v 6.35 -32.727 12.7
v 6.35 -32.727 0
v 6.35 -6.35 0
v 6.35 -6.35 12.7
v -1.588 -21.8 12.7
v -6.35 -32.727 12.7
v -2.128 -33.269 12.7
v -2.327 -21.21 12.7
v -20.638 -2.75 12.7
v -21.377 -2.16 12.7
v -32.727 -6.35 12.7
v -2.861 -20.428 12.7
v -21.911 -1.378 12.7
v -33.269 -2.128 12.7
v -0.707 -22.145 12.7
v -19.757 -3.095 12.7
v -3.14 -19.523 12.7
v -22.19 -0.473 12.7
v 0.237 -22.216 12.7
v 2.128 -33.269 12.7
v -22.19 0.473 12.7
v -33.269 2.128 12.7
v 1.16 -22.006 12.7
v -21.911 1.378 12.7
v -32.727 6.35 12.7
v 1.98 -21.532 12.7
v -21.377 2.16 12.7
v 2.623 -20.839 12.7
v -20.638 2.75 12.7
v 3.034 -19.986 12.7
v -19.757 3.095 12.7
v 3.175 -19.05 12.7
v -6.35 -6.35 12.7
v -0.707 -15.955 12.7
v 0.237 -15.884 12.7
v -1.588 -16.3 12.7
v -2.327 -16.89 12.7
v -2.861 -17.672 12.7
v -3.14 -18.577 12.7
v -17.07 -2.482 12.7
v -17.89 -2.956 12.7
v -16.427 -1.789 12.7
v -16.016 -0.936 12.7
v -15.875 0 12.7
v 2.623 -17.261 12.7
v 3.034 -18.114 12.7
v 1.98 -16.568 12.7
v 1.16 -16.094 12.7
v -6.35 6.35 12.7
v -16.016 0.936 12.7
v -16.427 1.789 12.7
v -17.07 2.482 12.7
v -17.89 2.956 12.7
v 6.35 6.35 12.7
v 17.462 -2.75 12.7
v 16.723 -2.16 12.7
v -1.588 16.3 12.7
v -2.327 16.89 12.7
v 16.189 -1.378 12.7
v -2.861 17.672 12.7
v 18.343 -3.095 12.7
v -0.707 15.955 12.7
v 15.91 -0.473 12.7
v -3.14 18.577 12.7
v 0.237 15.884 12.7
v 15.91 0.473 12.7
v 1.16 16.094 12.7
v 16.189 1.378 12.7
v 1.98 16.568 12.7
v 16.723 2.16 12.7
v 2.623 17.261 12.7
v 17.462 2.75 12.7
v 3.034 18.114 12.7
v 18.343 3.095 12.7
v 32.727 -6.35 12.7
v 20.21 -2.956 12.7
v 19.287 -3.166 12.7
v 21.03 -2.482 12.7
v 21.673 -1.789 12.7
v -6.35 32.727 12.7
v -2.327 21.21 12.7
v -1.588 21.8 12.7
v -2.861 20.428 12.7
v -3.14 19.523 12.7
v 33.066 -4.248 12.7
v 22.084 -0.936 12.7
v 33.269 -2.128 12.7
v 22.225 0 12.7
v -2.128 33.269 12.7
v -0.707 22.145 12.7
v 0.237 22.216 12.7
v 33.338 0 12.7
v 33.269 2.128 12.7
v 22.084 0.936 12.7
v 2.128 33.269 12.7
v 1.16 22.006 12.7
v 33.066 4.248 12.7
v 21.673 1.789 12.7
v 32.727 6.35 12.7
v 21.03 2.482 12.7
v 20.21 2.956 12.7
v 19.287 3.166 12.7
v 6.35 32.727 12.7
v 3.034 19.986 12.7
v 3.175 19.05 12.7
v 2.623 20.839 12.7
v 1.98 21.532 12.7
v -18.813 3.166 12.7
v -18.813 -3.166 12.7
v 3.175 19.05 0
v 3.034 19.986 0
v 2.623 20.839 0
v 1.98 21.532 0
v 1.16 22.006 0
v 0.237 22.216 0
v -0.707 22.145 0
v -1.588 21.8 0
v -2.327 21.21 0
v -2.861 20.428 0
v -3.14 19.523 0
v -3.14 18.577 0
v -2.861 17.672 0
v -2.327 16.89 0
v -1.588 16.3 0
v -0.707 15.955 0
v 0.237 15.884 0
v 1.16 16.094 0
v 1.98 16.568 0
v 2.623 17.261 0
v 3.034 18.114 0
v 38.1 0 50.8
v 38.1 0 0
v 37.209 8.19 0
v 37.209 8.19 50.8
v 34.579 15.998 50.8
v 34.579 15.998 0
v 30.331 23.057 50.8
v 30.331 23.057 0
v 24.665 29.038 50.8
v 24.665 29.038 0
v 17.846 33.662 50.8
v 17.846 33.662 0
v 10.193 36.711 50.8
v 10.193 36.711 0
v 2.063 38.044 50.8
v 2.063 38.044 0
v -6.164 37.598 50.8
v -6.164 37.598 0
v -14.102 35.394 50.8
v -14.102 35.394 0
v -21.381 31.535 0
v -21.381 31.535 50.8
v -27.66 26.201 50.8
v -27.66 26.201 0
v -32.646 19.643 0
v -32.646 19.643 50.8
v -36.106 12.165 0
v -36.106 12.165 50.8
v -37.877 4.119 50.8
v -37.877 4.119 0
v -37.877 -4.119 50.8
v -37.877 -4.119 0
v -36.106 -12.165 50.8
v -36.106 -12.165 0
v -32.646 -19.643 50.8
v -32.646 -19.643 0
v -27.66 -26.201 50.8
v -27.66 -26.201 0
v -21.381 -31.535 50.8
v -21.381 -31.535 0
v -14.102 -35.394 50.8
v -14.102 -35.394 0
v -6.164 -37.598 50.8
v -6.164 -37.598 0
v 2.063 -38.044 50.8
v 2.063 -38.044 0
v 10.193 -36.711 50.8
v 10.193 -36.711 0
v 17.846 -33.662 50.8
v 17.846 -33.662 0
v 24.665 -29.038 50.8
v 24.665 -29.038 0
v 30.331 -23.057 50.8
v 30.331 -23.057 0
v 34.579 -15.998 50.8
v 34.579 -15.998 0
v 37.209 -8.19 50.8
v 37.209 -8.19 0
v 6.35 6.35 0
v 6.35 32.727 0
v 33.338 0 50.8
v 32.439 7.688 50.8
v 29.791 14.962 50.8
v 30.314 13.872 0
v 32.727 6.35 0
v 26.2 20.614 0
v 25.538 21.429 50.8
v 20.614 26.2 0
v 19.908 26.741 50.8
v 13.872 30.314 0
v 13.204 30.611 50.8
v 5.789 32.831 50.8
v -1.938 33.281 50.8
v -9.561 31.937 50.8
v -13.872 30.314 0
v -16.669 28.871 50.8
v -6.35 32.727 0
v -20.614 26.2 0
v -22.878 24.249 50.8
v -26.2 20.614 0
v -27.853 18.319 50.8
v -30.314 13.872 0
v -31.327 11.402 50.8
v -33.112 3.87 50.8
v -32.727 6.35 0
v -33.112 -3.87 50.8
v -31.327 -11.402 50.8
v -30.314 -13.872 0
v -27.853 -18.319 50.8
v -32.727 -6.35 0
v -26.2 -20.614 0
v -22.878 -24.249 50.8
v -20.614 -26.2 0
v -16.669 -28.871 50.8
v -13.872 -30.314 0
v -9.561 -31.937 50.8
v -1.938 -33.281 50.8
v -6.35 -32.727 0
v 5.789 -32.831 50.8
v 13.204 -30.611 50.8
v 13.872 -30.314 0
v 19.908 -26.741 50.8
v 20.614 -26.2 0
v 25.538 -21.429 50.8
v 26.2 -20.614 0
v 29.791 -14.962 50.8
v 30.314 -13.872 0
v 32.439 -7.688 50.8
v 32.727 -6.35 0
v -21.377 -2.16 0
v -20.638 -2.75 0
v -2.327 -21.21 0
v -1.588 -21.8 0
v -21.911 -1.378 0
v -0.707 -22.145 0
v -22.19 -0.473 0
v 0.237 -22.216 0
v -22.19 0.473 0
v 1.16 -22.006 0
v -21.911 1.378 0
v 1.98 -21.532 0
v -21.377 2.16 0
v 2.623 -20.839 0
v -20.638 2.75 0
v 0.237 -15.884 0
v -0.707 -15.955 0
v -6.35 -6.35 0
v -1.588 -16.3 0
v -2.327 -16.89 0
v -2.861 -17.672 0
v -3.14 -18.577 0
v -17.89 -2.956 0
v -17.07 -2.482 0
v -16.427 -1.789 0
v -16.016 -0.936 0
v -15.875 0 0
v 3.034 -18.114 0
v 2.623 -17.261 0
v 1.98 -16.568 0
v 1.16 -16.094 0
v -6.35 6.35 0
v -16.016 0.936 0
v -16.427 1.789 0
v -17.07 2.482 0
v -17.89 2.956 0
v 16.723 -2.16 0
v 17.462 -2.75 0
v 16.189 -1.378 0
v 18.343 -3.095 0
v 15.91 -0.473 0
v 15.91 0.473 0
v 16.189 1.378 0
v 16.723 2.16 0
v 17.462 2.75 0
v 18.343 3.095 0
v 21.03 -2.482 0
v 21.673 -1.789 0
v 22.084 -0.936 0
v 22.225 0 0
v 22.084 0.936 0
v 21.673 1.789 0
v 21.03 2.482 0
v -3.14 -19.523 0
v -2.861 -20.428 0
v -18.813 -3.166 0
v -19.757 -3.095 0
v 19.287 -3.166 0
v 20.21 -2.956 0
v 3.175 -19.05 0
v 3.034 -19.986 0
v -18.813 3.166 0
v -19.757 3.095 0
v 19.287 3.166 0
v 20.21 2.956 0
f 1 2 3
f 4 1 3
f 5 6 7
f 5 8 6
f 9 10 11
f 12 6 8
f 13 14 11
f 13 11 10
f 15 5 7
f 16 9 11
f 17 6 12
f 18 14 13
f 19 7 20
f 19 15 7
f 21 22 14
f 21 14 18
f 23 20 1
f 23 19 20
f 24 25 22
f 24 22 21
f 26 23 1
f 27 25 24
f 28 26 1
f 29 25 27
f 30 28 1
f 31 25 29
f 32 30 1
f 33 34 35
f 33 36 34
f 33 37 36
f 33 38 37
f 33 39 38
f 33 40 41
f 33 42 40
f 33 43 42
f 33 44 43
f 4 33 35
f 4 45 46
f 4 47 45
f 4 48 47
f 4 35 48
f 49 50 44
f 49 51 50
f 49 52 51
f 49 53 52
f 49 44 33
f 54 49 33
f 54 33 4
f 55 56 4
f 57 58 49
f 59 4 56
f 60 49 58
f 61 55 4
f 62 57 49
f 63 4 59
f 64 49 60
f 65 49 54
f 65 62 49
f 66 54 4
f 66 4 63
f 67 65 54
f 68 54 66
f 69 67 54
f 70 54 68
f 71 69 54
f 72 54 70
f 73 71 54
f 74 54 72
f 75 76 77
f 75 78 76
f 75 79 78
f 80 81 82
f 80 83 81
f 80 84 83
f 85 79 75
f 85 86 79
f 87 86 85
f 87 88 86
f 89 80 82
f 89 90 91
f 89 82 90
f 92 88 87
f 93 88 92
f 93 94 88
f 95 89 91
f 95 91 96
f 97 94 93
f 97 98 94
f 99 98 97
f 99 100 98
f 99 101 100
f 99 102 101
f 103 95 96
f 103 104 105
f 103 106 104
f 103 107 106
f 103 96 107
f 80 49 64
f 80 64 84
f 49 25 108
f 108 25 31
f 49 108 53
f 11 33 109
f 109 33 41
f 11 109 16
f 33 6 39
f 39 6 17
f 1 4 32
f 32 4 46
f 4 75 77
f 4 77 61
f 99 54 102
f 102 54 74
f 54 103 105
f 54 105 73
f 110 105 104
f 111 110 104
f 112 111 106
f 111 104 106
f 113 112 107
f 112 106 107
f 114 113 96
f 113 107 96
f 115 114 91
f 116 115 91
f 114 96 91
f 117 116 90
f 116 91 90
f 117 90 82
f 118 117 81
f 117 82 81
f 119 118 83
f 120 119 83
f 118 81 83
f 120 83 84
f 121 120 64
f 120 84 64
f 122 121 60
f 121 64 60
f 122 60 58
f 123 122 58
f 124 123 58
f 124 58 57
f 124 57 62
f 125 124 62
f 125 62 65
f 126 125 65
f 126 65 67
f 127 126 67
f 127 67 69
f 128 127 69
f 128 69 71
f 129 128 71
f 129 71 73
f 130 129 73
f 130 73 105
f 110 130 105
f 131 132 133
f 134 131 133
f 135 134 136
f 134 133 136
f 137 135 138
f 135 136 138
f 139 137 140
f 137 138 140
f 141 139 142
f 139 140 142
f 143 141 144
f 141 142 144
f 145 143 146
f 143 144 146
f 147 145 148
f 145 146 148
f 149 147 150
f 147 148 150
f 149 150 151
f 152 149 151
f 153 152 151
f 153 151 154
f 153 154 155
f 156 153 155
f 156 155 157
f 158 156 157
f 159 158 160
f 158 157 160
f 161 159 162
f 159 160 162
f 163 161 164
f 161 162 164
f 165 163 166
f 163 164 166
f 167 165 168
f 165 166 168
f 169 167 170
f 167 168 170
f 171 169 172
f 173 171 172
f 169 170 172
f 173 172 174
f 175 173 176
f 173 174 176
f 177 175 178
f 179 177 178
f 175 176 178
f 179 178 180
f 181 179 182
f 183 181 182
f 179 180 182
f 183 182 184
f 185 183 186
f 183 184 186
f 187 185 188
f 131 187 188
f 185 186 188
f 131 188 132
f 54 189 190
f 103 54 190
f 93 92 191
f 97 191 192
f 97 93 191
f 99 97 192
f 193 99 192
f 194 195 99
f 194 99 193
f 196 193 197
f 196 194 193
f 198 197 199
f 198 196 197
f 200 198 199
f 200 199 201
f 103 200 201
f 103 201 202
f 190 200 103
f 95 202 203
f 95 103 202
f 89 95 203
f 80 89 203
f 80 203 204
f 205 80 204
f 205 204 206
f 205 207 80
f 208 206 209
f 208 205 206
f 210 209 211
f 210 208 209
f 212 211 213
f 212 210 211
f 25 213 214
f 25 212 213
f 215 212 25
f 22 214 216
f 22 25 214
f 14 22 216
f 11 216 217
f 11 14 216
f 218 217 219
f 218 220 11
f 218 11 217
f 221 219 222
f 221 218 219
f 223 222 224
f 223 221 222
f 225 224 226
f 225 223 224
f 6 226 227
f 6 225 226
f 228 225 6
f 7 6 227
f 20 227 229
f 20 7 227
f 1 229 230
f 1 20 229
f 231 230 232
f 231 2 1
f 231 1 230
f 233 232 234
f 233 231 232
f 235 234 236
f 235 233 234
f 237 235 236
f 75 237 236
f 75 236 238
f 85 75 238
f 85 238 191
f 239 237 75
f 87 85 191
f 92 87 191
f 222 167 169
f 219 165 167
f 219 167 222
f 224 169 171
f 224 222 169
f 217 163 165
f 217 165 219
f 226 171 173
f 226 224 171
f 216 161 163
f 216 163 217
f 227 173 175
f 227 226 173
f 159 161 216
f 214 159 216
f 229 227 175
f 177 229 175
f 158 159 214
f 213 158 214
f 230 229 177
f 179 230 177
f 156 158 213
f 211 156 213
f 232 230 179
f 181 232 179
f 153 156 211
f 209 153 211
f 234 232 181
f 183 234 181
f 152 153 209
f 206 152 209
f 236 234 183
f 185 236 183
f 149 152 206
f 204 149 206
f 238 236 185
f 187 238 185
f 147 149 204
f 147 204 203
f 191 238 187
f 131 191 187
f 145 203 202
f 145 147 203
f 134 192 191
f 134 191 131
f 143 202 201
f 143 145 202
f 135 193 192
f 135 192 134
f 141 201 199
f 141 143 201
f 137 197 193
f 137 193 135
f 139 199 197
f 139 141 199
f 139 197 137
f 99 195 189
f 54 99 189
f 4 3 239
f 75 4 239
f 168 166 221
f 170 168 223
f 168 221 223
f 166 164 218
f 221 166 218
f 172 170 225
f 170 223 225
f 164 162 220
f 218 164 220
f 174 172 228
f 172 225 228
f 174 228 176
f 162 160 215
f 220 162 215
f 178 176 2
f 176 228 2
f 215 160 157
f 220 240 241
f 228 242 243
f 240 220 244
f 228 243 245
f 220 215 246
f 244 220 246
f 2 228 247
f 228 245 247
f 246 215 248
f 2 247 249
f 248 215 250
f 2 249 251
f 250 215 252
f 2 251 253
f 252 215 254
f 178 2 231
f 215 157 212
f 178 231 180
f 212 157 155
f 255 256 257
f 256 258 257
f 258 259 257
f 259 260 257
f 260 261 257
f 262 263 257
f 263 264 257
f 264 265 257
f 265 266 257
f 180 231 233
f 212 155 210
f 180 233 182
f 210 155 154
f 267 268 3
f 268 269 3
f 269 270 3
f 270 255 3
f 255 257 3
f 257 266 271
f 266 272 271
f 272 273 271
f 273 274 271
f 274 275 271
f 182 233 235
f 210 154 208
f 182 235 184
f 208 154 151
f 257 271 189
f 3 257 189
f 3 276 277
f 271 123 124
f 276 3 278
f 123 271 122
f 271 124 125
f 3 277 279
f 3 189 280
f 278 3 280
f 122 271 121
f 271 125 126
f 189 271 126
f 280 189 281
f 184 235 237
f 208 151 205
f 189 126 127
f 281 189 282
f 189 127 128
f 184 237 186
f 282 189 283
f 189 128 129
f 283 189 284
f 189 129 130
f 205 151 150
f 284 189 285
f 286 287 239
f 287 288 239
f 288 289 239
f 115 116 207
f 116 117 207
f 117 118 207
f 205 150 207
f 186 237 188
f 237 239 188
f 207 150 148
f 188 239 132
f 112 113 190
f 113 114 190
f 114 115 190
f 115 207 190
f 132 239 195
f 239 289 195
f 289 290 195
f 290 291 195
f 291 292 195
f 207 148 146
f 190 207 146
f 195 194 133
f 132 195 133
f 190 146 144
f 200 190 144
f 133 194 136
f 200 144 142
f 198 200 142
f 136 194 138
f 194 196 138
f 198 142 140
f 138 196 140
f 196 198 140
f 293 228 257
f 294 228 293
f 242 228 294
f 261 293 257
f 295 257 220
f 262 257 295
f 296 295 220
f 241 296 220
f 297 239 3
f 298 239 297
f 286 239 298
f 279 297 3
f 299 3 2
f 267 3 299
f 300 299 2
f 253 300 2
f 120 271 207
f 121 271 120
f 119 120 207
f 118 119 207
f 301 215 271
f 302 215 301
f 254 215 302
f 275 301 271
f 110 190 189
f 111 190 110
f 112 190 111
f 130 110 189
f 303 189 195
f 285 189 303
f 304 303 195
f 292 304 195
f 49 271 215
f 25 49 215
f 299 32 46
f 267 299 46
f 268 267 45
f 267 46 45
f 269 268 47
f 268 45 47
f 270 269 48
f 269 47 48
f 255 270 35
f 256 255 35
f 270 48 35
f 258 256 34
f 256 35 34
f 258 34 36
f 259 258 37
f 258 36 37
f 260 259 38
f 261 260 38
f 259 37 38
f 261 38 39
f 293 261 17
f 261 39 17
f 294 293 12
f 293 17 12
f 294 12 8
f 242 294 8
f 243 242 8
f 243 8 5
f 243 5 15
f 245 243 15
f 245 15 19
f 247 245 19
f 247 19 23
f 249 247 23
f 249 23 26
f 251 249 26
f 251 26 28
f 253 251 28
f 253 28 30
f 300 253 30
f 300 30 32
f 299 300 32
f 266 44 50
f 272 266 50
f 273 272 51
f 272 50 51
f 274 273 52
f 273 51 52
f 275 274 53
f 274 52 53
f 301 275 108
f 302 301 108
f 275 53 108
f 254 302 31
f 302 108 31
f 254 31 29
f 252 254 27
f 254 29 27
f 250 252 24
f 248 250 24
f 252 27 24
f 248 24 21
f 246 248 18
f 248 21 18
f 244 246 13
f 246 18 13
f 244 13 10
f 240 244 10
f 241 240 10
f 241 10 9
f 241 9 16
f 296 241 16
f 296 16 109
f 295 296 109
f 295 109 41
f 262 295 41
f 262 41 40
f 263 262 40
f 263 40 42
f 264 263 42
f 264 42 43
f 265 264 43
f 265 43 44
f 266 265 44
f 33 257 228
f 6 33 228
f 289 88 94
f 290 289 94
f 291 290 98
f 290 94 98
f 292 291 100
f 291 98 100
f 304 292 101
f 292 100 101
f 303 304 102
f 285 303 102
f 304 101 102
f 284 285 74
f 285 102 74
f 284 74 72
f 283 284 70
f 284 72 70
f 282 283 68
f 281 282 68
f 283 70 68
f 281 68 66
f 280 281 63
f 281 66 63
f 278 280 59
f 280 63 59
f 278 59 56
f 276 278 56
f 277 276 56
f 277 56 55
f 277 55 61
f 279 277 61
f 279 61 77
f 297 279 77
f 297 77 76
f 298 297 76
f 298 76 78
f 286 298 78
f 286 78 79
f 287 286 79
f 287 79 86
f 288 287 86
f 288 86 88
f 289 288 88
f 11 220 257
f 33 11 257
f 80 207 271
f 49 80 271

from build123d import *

# Parameters (mm, degrees)
F0_R     = 38.1
F0_R_2   = 33.3375
F1_DEPTH = 50.8
F3_DEPTH = 12.7
F4_R     = 3.175
F5_DEPTH = 25.4


with BuildPart() as f1:
    # F0 (on Top) → F1 (new body)
    with BuildSketch(Plane.XY):
        Circle(F0_R)
        Circle(F0_R_2, mode=Mode.SUBTRACT)
    extrude(amount=F1_DEPTH)

    # F2 (on Top) → F3 (join)
    with BuildSketch(Plane.XY):
        Polygon((-6.35, 35.346381), (-6.35, 6.35), (-35.763424, 6.35), (-35.763424, -6.35), (-6.35, -6.35), (-6.35, -35.284743), (6.35, -35.284743), (6.35, -6.35), (35.550121, -6.35), (35.550121, 6.35), (6.35, 6.35), (6.35, 35.346381), align=None)
    extrude(amount=F3_DEPTH)

    # F4 (on face) → F5 (cut)
    with BuildSketch(Plane.XY.offset(12.7)):
        with Locations((-19.05, 0)):
            Circle(F4_R)
        with Locations((19.05, 0)):
            Circle(F4_R)
        with Locations((0, 19.05)):
            Circle(F4_R)
        with Locations((0, -19.05)):
            Circle(F4_R)
    extrude(amount=-F5_DEPTH, mode=Mode.SUBTRACT)


solid = f1.part
